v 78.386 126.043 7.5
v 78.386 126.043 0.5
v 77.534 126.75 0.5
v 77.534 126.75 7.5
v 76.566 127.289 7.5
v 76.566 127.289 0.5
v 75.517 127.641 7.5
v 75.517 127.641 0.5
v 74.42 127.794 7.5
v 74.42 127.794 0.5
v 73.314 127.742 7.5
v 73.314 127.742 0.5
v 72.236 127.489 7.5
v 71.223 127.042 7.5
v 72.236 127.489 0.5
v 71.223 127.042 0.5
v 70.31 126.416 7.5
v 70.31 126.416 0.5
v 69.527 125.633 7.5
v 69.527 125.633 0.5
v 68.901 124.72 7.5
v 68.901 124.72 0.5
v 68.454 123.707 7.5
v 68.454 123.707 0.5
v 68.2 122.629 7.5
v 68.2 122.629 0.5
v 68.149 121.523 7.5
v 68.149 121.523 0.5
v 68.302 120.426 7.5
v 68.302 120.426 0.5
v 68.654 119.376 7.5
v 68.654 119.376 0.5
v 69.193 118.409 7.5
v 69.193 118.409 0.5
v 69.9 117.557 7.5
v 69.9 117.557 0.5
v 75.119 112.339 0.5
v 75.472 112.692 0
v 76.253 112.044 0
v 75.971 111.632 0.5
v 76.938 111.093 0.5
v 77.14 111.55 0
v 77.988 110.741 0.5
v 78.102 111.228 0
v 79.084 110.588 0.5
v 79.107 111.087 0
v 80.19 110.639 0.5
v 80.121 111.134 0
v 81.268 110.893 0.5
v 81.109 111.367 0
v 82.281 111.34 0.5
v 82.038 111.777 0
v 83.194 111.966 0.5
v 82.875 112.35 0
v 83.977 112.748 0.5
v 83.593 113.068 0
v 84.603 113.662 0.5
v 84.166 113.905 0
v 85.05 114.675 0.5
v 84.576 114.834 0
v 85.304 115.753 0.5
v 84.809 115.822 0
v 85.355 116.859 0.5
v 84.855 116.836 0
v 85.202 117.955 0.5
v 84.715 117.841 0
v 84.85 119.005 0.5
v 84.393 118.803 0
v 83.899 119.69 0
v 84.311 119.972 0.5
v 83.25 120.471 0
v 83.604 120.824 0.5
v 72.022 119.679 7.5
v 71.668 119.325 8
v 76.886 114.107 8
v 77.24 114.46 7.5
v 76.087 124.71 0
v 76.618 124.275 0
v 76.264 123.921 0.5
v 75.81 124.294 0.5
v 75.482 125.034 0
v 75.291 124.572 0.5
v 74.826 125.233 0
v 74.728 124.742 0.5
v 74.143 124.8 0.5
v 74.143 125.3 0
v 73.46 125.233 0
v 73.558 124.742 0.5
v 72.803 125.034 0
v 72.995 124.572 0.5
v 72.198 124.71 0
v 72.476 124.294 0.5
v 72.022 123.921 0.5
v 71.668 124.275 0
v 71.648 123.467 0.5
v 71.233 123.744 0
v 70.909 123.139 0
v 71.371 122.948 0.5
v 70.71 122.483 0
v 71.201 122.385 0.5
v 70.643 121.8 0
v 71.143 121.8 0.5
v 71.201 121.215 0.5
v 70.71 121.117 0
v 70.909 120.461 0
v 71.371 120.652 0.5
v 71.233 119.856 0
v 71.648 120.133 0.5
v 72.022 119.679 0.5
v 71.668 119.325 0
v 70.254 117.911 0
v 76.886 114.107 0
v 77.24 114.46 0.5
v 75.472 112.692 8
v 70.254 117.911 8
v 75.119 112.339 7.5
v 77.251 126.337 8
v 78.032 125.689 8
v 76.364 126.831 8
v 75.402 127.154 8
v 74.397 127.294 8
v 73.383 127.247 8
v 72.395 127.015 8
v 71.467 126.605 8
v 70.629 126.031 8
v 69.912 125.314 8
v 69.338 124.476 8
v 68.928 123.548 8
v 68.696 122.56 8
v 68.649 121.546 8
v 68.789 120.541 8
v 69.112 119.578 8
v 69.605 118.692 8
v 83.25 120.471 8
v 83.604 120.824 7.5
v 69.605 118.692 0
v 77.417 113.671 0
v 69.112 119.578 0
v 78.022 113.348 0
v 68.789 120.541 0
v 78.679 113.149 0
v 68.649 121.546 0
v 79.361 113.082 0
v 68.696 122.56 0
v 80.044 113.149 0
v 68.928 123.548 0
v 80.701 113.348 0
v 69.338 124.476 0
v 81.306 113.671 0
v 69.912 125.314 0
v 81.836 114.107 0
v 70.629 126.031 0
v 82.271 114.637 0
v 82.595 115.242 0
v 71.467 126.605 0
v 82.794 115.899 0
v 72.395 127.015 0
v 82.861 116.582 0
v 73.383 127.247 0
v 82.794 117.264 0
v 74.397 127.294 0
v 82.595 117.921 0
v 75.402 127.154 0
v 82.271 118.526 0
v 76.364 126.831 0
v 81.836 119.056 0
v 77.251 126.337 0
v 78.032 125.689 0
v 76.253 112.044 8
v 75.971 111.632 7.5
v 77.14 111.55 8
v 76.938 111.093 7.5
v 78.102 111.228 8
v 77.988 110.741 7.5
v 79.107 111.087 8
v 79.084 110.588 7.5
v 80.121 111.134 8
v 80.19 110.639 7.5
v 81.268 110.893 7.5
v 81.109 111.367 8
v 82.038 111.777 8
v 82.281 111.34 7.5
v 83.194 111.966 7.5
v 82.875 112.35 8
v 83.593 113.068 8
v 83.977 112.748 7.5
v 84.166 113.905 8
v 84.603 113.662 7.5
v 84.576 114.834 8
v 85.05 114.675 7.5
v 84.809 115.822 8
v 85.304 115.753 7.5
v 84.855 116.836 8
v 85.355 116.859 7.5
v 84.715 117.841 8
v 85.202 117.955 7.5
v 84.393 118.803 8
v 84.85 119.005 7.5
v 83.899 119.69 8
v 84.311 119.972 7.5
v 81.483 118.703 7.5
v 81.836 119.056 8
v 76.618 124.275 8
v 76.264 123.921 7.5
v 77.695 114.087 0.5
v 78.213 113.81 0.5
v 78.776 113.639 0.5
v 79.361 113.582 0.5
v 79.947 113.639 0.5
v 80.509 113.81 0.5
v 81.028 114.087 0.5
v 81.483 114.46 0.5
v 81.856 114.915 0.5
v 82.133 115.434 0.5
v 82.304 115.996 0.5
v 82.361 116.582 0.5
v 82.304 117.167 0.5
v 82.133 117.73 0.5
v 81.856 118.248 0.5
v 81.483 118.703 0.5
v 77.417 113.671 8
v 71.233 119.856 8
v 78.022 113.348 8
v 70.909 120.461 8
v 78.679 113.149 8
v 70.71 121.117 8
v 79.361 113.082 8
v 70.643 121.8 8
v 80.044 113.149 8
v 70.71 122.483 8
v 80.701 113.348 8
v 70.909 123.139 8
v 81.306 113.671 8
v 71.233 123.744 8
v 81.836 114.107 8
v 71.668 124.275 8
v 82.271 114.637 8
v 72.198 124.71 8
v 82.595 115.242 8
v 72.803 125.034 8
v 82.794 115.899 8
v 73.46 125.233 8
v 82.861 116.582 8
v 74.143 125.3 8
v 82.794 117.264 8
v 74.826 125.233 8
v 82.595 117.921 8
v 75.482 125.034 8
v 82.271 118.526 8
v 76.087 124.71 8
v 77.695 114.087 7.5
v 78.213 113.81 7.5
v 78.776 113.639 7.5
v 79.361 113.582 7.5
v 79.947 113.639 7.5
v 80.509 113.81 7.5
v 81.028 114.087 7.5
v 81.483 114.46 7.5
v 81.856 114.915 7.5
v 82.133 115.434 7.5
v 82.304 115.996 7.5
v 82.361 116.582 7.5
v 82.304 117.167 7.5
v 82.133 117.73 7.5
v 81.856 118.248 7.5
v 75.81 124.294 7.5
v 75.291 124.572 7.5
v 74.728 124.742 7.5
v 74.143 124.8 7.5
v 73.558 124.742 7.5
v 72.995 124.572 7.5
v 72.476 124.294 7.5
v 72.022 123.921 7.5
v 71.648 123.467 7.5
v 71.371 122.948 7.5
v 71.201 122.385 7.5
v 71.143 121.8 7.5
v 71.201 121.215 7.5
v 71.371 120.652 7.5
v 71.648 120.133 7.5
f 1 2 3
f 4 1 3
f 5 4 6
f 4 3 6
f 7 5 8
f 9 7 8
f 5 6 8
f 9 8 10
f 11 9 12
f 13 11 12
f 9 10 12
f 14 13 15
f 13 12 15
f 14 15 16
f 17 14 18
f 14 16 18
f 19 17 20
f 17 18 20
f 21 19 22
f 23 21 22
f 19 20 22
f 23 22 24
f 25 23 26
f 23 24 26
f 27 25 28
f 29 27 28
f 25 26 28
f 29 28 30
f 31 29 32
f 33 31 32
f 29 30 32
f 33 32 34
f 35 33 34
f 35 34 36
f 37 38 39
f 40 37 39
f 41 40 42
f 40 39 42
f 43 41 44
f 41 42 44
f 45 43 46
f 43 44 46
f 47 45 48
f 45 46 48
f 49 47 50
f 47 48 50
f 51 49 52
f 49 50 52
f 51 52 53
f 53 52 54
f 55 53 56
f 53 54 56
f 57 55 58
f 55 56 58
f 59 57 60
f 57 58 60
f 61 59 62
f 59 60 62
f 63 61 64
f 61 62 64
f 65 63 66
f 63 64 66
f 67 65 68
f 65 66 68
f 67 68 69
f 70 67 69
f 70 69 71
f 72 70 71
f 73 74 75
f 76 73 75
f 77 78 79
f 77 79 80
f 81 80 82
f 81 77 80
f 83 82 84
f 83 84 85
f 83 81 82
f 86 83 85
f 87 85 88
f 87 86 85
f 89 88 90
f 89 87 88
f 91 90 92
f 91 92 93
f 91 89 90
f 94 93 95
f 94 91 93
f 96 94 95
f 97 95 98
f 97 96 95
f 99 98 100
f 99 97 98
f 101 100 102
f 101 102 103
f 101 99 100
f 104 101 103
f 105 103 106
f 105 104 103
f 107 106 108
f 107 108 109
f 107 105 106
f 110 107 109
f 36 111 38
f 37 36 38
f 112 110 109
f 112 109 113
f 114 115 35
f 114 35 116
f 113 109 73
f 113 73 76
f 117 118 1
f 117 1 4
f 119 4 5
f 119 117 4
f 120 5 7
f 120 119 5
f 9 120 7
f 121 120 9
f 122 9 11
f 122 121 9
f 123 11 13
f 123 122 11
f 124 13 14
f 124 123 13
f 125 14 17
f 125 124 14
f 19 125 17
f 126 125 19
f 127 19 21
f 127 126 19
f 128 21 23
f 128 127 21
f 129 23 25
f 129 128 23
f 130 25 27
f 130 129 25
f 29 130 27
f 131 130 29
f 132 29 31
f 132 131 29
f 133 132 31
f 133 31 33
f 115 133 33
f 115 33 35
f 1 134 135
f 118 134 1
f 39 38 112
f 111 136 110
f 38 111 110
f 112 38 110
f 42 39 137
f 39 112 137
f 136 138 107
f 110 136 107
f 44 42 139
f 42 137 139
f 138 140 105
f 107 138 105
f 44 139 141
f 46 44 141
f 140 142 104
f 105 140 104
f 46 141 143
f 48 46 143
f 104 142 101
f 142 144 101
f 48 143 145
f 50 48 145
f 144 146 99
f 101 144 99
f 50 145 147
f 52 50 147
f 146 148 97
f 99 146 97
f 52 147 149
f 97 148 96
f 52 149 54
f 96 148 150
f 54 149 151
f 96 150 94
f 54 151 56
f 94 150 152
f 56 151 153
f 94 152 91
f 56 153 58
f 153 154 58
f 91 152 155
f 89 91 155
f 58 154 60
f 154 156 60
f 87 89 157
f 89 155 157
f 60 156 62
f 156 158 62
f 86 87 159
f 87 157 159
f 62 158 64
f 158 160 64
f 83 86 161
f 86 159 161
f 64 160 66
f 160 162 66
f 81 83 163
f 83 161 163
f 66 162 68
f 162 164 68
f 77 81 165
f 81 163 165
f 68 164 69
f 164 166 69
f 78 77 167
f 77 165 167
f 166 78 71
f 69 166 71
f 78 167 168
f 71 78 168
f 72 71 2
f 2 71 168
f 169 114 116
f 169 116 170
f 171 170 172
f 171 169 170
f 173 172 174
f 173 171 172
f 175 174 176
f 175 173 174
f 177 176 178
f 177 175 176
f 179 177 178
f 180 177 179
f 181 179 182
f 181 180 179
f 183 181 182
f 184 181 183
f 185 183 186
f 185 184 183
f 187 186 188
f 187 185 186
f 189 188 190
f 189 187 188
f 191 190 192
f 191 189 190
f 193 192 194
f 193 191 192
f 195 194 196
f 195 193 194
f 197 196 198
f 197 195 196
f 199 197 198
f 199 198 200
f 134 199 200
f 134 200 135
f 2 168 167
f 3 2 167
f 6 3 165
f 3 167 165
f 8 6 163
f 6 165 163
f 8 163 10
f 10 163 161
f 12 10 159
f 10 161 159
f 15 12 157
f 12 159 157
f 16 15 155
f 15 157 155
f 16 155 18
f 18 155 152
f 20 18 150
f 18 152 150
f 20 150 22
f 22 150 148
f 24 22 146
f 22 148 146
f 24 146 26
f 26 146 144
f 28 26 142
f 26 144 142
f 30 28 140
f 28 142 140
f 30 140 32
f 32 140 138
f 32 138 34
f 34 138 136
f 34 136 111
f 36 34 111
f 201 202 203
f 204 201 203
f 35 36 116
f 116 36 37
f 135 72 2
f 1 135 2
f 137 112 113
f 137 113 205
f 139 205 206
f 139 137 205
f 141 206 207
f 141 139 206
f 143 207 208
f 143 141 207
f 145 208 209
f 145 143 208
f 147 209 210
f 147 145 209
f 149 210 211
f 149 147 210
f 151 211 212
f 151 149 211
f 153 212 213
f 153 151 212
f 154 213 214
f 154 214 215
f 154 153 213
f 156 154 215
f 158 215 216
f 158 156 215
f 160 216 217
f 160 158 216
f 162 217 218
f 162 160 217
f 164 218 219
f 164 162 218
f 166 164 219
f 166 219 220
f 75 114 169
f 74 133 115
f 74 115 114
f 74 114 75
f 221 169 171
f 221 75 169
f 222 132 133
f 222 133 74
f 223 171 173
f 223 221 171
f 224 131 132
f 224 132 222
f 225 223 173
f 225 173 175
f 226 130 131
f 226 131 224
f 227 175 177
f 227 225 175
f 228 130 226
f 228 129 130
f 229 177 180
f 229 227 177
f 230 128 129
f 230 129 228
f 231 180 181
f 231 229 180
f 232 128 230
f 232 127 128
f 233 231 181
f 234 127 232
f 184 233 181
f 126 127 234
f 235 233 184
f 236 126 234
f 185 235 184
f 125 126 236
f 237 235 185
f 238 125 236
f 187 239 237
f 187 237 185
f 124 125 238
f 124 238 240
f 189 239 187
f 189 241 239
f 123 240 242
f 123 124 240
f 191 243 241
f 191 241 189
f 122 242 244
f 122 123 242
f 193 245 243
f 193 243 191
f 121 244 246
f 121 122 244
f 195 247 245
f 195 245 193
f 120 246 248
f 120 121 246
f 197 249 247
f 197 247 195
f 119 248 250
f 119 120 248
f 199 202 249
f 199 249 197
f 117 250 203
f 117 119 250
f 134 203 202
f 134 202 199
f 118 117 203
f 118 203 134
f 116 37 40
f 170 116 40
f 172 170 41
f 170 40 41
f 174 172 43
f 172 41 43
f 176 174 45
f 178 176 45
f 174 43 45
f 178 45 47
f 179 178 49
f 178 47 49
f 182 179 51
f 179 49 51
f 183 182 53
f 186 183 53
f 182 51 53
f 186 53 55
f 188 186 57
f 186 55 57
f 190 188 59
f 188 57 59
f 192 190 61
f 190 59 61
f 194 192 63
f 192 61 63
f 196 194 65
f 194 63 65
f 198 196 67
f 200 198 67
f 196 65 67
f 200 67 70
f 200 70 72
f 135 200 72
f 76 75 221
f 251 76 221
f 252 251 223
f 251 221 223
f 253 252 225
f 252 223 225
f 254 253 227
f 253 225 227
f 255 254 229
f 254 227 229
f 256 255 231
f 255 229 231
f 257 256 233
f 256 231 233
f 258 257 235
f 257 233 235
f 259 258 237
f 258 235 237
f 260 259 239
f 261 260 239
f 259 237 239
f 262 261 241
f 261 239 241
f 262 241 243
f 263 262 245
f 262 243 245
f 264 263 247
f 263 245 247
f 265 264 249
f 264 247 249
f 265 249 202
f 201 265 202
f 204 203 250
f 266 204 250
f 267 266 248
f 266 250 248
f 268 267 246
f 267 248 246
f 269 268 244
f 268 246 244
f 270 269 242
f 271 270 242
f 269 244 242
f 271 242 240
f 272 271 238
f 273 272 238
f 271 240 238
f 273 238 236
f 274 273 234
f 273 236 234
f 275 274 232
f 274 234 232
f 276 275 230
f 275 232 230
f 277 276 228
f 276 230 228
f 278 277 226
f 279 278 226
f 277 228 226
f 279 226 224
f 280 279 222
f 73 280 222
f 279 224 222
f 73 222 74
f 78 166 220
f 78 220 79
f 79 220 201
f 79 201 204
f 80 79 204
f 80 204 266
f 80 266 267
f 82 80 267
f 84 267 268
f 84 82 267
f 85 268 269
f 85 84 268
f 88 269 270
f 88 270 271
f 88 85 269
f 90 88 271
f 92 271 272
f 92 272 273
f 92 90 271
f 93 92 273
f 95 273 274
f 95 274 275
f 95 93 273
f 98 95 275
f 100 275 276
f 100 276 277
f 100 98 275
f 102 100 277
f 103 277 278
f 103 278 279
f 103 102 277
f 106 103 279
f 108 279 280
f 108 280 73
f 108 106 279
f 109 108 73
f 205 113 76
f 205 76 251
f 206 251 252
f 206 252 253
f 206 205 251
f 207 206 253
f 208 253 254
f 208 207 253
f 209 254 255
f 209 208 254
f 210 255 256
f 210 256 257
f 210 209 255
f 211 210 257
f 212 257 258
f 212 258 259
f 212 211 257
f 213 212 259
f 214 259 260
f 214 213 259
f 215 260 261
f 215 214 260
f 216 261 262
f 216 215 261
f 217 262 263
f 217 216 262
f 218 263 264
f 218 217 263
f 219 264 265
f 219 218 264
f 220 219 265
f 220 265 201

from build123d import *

# Parameters (mm, degrees)
BOSS_EXTRUDE1_DEPTH = 8
CHAMFER1_SIZE       = 0.5


with BuildPart() as part:
    # Sketch1 → Boss-Extrude1 (new body)
    with BuildSketch(Plane.XY):
        with BuildLine():
            Line((69.900235992, 117.557359313), (75.118684037, 112.338911268))
            ThreePointArc((75.118684037, 112.338911268), (83.603965411, 112.338911268), (83.603965411, 120.824192642))
            Line((83.603965411, 120.824192642), (78.385517366, 126.042640687))
            ThreePointArc((78.385517366, 126.042640687), (69.900235992, 126.042640687), (69.900235992, 117.557359313))
        make_face()
        with BuildLine():
            Line((72.021556335, 119.678679656), (77.24000438, 114.460231611))
            ThreePointArc((77.24000438, 114.460231611), (81.482645068, 114.460231611), (81.482645068, 118.702872298))
            Line((81.482645068, 118.702872298), (76.264197022, 123.921320344))
            ThreePointArc((76.264197022, 123.921320344), (72.021556335, 123.921320344), (72.021556335, 119.678679656))
        make_face(mode=Mode.SUBTRACT)
    extrude(amount=BOSS_EXTRUDE1_DEPTH)

    # Chamfer1
    chamfer1_edges = [part.edges().sort_by_distance(p)[0] for p in [
        (83.603965411, 112.338911268, 8),
        (80.994741388, 123.433416665, 8),
        (72.021556335, 123.921320344, 0),
        (74.630780358, 117.069455634, 0),
        (81.482645068, 114.460231611, 0),
        (78.873421045, 121.312096321, 0),
        (72.021556335, 123.921320344, 8),
        (74.630780358, 117.069455634, 8),
        (81.482645068, 114.460231611, 8),
        (78.873421045, 121.312096321, 8),
        (69.900235992, 126.042640687, 8),
        (80.994741388, 123.433416665, 0),
        (83.603965411, 112.338911268, 0),
        (72.509460014, 114.94813529, 0),
        (69.900235992, 126.042640687, 0),
        (72.509460014, 114.94813529, 8),
    ]]
    chamfer(chamfer1_edges, length=CHAMFER1_SIZE)


solid = part.part
